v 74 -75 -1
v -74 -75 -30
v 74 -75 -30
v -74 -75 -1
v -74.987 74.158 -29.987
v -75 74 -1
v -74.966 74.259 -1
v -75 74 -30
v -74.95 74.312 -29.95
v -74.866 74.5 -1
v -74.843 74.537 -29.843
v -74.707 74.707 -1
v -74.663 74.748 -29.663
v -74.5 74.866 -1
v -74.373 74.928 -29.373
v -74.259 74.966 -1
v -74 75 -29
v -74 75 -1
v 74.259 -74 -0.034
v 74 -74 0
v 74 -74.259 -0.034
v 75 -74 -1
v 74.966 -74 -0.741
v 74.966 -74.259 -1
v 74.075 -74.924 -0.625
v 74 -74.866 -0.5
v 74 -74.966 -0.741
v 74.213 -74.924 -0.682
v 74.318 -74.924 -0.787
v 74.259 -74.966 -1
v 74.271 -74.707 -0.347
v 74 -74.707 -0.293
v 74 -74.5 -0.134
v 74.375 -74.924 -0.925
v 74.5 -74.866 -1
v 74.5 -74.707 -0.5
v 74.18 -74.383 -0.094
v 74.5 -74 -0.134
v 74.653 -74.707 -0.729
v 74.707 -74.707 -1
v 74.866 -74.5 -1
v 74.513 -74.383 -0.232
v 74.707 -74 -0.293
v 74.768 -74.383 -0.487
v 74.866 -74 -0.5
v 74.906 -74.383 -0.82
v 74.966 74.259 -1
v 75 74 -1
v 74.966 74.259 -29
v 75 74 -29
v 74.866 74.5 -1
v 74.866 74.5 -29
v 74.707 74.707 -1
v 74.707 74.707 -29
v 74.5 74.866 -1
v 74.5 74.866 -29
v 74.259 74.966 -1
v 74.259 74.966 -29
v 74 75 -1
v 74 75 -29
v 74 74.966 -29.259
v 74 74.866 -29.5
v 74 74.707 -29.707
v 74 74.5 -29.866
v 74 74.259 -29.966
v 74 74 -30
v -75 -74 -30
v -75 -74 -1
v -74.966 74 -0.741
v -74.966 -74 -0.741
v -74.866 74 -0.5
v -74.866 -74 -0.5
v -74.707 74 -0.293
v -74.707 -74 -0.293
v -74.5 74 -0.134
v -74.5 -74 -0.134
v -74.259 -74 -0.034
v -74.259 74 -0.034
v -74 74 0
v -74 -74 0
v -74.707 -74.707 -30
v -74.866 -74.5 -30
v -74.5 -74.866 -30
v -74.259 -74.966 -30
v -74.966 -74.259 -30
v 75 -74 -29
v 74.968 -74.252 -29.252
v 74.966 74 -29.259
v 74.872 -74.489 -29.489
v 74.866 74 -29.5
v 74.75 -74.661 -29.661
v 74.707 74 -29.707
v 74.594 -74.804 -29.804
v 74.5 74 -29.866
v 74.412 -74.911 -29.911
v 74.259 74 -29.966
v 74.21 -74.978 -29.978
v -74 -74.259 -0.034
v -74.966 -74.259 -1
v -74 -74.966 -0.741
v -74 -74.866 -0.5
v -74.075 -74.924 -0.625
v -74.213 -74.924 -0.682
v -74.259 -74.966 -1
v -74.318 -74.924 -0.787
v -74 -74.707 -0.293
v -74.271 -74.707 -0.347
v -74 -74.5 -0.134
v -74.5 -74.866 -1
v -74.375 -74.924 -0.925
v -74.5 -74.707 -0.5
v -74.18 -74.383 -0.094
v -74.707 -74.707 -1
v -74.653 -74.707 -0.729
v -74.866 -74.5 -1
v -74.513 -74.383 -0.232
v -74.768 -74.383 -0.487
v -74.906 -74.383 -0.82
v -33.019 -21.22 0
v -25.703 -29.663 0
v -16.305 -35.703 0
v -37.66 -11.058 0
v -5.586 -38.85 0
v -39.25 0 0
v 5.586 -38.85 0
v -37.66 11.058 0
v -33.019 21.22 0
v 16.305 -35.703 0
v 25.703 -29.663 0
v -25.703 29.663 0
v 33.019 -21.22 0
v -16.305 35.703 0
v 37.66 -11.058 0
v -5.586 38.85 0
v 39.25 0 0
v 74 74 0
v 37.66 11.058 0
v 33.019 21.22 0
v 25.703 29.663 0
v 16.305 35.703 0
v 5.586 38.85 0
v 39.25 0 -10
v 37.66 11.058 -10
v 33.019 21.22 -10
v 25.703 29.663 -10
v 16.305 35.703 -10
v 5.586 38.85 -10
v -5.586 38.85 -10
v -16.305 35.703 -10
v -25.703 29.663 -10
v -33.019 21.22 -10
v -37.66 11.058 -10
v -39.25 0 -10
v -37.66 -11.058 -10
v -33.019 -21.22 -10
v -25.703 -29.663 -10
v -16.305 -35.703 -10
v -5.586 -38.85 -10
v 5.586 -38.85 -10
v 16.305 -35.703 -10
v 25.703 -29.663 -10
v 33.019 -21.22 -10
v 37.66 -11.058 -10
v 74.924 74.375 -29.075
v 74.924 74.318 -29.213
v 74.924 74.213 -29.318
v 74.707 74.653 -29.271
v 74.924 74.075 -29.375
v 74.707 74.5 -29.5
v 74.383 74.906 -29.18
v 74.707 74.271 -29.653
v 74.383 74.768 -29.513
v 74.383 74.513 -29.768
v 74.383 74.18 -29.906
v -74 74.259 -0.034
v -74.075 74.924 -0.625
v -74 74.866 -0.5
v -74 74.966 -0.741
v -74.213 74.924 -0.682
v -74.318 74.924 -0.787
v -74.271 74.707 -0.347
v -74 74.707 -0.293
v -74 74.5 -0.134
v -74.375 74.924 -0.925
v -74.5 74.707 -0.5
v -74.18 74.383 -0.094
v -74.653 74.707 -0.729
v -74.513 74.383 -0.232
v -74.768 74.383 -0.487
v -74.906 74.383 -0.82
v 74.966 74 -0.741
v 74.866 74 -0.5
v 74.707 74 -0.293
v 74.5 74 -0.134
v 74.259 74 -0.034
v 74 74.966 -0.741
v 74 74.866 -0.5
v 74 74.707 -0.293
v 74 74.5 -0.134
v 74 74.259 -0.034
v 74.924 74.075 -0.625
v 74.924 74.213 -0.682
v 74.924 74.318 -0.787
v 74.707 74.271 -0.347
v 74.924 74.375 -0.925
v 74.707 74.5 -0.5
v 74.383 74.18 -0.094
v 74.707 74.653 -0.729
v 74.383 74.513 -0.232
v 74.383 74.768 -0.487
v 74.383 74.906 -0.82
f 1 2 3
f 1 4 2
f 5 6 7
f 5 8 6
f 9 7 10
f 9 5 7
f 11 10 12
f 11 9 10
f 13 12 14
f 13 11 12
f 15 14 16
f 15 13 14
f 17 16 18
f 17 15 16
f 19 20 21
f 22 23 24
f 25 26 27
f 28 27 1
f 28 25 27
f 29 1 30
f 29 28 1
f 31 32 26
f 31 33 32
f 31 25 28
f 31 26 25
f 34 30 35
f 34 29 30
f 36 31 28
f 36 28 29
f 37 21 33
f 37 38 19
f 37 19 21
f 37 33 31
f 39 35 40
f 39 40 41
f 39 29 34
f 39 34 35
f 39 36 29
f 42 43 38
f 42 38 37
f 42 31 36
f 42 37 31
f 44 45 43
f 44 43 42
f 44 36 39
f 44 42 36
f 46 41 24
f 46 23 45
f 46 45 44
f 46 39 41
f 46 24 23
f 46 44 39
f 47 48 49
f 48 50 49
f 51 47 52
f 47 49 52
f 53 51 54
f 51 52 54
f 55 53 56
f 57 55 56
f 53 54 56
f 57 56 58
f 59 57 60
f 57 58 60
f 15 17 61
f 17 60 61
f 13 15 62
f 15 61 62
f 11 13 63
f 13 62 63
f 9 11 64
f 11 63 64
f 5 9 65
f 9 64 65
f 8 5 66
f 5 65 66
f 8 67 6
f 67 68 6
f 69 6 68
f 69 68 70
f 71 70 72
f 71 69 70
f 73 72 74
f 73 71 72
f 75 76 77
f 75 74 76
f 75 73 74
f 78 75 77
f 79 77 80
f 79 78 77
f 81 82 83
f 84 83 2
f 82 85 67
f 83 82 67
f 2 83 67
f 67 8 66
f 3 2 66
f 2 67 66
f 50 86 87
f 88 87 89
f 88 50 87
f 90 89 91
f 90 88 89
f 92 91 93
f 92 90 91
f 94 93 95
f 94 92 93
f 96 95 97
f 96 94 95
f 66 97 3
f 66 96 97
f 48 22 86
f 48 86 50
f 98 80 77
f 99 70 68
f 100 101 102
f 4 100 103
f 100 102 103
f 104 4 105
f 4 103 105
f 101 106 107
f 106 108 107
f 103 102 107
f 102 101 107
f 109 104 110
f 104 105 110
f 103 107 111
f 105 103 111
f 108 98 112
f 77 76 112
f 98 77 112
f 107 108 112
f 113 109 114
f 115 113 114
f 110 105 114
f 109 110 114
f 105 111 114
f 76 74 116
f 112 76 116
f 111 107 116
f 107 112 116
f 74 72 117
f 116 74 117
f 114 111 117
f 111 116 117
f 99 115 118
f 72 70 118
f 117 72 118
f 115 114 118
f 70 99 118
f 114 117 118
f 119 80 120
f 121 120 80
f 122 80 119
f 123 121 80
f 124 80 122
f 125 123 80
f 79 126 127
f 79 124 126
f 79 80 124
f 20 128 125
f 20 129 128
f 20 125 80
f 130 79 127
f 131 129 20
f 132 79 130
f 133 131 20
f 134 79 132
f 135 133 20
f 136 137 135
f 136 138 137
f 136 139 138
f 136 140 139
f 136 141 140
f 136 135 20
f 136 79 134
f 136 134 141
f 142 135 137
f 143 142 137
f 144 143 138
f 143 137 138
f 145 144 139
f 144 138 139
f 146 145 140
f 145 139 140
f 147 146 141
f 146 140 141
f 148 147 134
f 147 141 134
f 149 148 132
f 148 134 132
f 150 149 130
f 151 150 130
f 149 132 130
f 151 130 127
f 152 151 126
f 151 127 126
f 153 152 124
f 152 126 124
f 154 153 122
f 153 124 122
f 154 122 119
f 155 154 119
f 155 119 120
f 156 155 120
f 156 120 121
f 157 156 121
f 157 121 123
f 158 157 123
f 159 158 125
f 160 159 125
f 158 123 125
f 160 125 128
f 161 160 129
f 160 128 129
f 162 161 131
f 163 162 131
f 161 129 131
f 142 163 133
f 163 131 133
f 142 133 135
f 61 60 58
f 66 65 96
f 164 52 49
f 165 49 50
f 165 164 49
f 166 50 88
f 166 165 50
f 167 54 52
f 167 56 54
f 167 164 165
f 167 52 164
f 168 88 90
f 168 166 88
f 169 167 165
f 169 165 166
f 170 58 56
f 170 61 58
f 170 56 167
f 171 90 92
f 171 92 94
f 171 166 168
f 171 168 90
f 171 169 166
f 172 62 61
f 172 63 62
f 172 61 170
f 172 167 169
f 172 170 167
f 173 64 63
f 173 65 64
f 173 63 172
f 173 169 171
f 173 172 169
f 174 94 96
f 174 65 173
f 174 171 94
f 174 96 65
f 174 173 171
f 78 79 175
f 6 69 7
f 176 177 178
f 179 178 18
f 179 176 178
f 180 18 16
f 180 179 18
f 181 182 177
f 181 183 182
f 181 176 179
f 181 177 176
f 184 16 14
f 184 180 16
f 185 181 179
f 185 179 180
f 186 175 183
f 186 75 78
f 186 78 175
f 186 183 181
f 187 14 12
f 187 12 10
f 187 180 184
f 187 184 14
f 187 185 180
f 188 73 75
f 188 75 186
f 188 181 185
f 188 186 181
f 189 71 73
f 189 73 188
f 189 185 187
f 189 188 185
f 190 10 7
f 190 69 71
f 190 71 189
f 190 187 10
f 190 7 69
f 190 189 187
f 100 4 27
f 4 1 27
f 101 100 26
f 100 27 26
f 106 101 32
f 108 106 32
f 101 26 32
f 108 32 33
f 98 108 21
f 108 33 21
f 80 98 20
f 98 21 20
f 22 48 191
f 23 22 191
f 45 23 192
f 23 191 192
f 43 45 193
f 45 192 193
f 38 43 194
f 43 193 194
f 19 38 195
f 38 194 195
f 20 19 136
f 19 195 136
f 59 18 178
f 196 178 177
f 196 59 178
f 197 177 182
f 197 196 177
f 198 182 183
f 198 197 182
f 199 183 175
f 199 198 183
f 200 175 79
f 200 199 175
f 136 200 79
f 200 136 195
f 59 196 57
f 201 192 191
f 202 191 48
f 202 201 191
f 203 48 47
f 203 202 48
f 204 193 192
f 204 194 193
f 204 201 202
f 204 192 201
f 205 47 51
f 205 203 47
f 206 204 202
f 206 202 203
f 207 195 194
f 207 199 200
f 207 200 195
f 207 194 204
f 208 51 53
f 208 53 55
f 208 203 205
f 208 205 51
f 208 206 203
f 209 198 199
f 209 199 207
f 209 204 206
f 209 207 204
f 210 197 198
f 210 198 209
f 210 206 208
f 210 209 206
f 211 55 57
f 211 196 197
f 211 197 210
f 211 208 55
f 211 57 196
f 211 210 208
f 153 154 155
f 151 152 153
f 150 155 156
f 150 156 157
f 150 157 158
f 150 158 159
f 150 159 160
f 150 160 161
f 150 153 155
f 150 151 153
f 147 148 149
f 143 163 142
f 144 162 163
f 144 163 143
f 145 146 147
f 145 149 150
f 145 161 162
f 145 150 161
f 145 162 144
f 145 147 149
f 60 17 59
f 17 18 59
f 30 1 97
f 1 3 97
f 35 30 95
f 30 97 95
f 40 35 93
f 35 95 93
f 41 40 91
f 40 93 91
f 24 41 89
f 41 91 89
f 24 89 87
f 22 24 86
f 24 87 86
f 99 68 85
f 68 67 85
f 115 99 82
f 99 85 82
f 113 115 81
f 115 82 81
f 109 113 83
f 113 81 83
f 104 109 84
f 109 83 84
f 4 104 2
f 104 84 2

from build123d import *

# Parameters (mm, degrees)
SKETCH1_W           = 150
SKETCH1_H           = 150
BOSS_EXTRUDE1_DEPTH = 30
FILLET1_R           = 1
SKETCH2_R           = 39.25
CUT_EXTRUDE4_DEPTH  = 10


with BuildPart() as part:
    # Sketch1 → Boss-Extrude1 (new body)
    with BuildSketch(Plane.XY):
        Rectangle(SKETCH1_W, SKETCH1_H)
    extrude(amount=-BOSS_EXTRUDE1_DEPTH)

    # Fillet1
    fillet1_edges = [part.edges().sort_by_distance(p)[0] for p in [
        (0, 75, -30),
        (-75, 0, 0),
        (0, 75, 0),
        (75, 0, 0),
        (0, -75, 0),
        (-75, -75, -15),
        (-75, 75, -15),
        (75, 75, -15),
        (75, -75, -15),
        (75, 0, -30),
    ]]
    fillet(fillet1_edges, radius=FILLET1_R)

    # Sketch2 → Cut-Extrude4 (cut)
    with BuildSketch(Plane.XY):
        Circle(SKETCH2_R)
    extrude(amount=-CUT_EXTRUDE4_DEPTH, mode=Mode.SUBTRACT)


solid = part.part
